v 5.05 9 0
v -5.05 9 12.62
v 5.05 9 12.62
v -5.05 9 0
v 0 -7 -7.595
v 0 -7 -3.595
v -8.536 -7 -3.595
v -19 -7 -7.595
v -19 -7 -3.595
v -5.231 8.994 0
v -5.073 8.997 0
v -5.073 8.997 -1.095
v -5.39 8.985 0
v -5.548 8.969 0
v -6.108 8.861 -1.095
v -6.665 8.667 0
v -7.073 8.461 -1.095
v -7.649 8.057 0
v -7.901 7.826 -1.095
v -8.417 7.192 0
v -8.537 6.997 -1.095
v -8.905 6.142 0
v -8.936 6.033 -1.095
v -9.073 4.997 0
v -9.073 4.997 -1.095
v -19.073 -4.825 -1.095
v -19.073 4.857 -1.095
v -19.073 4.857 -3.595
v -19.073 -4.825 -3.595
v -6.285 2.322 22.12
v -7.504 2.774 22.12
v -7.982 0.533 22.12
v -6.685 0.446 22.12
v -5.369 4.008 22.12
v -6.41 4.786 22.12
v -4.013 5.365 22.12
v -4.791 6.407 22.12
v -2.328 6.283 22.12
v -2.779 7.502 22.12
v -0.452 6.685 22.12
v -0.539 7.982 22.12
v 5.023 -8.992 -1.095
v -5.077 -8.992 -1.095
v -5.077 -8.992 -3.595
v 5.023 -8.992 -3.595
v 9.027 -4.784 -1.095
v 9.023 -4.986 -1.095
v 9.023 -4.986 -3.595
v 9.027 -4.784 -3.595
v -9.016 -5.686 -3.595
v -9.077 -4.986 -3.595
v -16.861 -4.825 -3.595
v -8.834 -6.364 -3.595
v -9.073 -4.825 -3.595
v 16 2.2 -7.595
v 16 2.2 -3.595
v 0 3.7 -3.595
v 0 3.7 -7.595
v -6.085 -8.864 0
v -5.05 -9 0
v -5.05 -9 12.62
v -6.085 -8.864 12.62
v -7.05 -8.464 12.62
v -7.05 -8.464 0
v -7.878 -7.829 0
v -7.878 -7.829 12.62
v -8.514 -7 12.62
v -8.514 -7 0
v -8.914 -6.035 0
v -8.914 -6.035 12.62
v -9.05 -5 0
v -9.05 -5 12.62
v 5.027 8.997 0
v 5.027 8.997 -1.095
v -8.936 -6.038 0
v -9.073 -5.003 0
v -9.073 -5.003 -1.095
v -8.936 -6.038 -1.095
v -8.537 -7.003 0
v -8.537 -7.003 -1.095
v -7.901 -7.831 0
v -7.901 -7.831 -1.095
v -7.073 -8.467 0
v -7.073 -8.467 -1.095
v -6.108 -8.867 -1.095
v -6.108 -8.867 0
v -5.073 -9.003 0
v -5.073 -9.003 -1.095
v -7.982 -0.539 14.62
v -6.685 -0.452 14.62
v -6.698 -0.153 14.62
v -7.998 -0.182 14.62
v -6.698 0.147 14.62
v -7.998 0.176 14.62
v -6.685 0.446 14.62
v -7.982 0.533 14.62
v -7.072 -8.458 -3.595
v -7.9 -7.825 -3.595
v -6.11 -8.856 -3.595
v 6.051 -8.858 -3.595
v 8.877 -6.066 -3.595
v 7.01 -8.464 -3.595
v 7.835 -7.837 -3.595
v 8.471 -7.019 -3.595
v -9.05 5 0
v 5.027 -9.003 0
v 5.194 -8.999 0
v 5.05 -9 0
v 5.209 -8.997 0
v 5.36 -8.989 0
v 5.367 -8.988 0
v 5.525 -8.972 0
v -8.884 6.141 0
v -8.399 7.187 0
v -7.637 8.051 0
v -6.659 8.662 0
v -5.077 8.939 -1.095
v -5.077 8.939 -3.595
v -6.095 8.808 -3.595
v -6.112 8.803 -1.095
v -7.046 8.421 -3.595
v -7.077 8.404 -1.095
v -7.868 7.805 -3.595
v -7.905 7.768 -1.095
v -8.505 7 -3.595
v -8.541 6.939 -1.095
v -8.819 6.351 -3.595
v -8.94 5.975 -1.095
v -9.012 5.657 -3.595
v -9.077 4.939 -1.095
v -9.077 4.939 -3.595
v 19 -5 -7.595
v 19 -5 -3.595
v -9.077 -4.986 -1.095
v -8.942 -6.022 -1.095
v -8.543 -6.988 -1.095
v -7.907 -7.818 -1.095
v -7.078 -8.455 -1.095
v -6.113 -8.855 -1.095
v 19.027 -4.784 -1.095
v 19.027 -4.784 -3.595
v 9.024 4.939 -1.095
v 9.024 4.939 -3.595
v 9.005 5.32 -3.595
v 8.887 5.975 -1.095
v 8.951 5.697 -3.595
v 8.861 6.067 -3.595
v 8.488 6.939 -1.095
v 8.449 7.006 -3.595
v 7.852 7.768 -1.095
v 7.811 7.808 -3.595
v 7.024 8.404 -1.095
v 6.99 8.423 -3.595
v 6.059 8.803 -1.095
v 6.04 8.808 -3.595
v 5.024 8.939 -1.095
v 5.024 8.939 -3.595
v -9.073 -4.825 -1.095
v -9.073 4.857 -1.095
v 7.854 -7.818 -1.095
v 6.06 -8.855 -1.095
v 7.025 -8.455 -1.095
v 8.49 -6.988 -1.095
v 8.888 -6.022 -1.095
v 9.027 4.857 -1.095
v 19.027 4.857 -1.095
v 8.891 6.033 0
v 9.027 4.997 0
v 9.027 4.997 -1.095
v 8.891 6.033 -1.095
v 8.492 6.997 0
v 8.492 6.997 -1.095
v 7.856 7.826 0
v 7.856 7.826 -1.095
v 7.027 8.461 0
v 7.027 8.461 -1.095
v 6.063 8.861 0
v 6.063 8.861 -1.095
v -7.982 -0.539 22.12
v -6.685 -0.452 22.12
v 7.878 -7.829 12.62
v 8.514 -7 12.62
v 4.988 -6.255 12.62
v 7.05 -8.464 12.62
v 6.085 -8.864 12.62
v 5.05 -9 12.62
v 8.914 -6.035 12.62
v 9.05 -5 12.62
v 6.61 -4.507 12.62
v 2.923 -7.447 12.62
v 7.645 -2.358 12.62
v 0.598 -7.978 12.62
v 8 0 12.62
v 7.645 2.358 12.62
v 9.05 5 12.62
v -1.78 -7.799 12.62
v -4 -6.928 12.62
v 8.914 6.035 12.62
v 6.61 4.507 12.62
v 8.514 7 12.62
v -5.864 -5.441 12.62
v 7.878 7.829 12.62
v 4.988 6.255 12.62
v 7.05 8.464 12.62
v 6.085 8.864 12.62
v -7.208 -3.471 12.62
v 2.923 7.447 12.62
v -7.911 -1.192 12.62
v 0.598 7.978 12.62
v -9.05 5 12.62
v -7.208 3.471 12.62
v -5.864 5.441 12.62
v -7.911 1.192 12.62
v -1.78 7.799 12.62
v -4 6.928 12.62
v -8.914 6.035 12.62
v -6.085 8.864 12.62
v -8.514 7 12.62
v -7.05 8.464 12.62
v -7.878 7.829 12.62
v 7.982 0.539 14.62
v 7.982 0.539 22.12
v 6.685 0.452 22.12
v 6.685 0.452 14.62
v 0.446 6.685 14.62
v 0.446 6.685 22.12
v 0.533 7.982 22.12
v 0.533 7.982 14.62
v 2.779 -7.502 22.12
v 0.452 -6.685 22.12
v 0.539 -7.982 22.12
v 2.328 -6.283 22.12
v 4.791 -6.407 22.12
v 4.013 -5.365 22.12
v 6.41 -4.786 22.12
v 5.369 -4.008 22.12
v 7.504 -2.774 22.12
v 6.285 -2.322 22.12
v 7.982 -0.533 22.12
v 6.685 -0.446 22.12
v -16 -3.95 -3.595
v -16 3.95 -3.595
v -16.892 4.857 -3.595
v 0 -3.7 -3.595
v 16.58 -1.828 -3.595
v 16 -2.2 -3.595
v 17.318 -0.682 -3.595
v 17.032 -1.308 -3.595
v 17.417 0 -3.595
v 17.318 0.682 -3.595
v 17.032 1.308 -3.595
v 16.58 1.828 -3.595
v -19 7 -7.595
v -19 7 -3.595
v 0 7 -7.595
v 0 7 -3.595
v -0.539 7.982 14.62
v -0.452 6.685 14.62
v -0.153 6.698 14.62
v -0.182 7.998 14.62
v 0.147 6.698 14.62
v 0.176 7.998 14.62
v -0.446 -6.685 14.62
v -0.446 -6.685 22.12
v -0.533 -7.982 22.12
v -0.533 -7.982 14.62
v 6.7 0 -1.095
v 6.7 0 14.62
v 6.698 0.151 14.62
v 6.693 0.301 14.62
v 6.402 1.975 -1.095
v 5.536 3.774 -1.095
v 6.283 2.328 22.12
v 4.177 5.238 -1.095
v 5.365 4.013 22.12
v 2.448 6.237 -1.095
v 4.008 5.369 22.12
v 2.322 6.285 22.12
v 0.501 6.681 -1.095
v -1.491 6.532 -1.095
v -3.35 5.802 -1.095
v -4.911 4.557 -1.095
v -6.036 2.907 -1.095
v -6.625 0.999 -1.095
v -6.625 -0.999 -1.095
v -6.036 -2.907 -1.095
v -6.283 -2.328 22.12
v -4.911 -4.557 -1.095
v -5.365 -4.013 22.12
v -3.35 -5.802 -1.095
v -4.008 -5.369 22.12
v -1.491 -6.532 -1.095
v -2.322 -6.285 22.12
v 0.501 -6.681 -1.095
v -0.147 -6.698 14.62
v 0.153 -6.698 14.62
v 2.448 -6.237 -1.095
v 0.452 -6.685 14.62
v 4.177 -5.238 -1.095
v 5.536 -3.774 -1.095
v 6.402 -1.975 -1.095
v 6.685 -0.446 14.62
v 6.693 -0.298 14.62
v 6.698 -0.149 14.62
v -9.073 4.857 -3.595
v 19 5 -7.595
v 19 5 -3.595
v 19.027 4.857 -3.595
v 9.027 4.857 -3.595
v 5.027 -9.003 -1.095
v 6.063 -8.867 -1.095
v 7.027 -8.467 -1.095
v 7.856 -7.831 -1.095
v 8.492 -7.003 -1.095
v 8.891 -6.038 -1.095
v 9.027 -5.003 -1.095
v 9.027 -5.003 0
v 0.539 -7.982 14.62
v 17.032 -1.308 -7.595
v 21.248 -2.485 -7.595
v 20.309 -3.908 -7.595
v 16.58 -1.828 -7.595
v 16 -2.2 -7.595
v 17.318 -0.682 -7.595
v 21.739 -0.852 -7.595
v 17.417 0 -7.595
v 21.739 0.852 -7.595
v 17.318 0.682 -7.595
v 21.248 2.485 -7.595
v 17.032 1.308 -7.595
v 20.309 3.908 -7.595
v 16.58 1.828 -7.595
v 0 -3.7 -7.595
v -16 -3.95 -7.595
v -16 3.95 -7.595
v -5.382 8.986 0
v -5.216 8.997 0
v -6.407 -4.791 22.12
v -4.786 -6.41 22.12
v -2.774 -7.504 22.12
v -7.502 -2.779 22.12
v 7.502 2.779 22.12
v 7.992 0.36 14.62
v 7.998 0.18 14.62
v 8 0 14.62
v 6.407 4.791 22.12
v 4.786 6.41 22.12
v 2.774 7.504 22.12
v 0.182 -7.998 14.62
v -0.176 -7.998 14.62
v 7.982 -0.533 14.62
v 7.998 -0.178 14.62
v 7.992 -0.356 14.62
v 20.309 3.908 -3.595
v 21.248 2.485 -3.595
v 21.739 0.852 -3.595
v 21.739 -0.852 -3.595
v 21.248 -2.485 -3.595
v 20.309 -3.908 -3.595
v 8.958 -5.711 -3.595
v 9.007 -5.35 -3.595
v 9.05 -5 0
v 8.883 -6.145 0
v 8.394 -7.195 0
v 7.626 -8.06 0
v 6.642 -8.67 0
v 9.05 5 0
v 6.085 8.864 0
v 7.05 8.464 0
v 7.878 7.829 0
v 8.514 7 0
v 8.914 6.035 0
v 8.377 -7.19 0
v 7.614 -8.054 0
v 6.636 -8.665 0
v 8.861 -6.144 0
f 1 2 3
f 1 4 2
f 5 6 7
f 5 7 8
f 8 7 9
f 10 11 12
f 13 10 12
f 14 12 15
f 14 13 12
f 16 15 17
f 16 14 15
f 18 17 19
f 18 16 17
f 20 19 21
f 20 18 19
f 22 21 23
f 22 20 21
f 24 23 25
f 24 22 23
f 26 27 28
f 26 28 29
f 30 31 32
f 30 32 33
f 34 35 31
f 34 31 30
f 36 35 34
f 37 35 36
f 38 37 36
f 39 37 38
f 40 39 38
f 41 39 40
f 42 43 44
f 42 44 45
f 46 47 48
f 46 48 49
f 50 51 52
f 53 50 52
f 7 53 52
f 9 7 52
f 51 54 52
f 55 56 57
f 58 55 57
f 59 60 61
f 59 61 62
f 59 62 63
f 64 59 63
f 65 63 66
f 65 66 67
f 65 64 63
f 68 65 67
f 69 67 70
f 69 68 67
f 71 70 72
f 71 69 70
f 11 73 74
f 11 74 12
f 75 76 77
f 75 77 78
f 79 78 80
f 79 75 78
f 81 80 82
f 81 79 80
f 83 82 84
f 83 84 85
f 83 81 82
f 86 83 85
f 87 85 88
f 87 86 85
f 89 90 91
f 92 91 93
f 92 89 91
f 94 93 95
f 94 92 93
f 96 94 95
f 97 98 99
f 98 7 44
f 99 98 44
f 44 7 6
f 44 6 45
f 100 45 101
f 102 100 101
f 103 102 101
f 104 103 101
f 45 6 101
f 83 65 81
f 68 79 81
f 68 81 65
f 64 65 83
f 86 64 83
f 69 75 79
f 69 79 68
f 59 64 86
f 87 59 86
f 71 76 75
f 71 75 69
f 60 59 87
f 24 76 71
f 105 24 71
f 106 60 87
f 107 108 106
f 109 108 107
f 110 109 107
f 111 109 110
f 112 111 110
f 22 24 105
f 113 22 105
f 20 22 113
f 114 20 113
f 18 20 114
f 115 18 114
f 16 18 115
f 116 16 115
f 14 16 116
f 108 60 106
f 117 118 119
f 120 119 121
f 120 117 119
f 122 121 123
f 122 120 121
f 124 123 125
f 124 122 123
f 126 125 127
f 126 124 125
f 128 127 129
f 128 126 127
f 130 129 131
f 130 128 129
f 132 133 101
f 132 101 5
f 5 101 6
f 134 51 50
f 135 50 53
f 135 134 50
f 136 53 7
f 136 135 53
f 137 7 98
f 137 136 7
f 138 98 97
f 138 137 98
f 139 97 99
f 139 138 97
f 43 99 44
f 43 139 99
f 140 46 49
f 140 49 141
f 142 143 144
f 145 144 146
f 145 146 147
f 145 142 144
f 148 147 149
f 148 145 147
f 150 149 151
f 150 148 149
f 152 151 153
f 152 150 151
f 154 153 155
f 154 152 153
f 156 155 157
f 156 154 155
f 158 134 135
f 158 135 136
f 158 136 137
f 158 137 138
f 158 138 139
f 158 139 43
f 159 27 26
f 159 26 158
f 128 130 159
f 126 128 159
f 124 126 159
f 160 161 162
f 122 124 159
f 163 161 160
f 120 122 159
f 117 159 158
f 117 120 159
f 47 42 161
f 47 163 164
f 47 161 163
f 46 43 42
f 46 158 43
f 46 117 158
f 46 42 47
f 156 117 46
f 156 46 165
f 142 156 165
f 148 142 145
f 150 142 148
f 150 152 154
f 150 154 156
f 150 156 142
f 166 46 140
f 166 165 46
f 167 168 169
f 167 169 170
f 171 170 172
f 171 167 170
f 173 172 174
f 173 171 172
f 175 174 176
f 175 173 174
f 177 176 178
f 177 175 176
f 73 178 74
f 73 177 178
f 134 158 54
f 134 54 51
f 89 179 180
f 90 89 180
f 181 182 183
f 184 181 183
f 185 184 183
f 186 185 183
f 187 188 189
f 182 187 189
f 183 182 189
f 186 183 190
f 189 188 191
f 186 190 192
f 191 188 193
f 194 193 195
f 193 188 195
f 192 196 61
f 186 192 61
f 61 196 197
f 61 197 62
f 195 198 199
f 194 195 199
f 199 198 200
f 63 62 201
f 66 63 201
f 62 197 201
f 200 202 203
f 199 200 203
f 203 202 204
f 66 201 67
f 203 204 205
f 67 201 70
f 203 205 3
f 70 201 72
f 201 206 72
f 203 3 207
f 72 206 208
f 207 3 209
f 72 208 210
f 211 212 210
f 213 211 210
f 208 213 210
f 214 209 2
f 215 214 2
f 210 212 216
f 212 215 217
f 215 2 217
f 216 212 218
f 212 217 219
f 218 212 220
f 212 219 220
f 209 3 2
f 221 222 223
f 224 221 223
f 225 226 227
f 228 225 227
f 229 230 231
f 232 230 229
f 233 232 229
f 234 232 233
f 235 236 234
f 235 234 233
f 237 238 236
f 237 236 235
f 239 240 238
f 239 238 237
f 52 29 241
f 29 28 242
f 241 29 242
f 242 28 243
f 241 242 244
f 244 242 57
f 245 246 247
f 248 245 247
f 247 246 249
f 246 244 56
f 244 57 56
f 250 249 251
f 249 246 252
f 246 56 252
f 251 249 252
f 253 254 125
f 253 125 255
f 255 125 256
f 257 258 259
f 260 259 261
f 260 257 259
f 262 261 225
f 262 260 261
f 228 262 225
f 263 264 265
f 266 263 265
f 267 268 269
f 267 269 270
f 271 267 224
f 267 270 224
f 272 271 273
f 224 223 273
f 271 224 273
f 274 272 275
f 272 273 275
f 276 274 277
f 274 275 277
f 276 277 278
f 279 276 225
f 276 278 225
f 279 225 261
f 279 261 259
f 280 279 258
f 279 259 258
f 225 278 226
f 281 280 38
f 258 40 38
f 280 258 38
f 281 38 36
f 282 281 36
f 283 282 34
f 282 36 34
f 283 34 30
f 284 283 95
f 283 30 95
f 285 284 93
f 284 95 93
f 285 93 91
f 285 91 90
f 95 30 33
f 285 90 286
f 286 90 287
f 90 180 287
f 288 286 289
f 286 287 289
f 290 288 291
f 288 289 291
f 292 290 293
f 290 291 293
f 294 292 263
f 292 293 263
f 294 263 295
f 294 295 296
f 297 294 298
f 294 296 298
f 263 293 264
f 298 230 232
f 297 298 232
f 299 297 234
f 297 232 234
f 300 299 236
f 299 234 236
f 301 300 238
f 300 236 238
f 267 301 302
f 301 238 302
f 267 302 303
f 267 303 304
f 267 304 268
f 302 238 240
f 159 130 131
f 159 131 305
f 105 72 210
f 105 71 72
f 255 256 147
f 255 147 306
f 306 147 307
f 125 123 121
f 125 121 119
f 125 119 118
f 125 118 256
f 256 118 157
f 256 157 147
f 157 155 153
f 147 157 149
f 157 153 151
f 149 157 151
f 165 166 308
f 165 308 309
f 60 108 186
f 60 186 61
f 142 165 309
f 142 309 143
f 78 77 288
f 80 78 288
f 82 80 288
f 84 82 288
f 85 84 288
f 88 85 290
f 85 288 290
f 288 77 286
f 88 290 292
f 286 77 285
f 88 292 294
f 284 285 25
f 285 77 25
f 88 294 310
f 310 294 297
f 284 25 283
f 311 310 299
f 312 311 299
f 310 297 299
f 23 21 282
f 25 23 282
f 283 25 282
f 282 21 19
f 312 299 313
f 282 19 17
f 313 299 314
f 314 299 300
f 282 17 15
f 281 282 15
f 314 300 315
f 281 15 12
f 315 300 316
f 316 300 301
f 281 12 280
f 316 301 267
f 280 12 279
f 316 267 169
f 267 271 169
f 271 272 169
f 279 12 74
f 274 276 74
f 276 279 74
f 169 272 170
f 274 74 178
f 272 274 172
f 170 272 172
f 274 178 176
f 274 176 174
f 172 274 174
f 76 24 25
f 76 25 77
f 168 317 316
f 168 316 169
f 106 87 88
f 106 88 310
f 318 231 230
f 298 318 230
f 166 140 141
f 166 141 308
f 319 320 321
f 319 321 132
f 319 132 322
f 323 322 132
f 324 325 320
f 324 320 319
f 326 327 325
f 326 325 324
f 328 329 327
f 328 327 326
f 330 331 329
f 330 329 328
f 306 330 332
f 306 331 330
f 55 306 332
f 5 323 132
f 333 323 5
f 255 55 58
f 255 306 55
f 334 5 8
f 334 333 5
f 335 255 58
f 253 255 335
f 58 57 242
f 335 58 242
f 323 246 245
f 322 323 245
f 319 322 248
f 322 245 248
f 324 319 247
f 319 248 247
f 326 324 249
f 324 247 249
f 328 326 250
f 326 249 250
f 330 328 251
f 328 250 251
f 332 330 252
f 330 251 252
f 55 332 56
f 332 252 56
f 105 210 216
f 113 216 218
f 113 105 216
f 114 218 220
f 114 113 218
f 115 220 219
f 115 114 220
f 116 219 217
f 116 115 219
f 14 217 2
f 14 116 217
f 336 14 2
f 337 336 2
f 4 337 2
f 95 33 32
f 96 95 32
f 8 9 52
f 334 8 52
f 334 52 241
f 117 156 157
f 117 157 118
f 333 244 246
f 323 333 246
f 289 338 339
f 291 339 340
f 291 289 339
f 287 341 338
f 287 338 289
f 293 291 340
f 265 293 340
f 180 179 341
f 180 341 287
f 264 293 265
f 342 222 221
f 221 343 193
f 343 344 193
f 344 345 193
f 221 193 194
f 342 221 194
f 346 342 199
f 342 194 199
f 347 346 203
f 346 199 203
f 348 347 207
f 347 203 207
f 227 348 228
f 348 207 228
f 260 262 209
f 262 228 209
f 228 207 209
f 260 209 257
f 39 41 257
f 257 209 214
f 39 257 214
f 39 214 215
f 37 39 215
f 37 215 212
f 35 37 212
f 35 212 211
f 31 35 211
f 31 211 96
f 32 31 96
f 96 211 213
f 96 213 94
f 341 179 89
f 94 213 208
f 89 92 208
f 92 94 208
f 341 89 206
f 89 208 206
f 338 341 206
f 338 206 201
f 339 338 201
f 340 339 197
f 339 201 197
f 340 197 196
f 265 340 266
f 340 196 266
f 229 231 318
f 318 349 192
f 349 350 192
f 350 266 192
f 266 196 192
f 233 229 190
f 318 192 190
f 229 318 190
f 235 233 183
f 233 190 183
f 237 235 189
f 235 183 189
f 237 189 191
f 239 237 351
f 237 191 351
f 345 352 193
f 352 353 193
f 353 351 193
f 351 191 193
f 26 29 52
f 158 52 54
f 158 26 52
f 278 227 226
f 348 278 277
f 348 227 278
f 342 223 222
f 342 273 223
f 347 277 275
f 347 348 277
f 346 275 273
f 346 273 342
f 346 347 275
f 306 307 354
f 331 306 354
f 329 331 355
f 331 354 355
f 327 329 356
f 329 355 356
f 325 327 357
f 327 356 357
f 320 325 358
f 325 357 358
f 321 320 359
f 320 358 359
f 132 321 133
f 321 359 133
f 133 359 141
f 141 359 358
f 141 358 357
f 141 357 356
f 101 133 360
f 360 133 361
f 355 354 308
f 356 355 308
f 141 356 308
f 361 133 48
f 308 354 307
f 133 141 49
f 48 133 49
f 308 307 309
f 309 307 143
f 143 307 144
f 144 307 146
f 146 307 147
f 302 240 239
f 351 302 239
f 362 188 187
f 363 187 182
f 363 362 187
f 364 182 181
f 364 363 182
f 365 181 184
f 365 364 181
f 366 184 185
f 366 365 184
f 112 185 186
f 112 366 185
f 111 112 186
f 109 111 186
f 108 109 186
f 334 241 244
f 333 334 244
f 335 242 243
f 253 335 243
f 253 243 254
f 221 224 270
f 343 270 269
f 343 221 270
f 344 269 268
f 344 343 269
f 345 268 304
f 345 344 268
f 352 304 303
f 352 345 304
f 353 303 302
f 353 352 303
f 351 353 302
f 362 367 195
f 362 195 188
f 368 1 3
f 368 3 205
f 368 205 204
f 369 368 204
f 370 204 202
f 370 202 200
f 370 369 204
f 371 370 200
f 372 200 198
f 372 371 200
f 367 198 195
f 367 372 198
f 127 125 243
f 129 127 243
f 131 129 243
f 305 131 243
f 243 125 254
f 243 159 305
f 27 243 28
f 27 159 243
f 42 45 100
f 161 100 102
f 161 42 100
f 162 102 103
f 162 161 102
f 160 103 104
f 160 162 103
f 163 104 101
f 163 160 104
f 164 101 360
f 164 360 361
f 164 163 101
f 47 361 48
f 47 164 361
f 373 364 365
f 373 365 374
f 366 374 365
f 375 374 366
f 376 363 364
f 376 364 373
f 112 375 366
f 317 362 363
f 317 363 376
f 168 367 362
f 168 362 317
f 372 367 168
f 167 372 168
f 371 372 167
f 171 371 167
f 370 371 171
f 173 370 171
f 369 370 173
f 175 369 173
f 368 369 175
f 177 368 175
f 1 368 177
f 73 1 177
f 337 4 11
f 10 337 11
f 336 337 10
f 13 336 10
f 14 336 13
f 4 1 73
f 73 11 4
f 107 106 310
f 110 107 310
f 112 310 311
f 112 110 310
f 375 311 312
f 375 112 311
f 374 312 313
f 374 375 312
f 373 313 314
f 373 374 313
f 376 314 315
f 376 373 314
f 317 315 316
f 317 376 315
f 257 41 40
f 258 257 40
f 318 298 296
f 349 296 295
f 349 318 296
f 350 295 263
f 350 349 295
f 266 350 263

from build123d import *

# Parameters (mm, degrees)
BOSS_EXTRUDE1_DEPTH = 2
BOSS_EXTRUDE2_DEPTH = 11.02
BOSS_EXTRUDE3_DEPTH = 1.6
SKETCH4_R           = 8
BOSS_EXTRUDE4_DEPTH = 9.5
SKETCH5_R           = 6.65
CUT_EXTRUDE1_DEPTH  = 20
BOSS_EXTRUDE5_DEPTH = 1.095
SKETCH13_R          = 6.7
CUT_EXTRUDE3_DEPTH  = 30
CUT_EXTRUDE4_DEPTH  = 7.5
CIRPATTERN2_COUNT   = 4
BOSS_EXTRUDE6_DEPTH = 2.5
BOSS_EXTRUDE7_DEPTH = 4


with BuildPart() as part:
    # Sketch1 → Boss-Extrude1 (new body)
    with BuildSketch(Plane.XY):
        with BuildLine():
            Line((-5.05, 9.000108401), (5.05, 9.000108401))
            ThreePointArc((5.05, 9.000108401), (7.878427125, 7.828535526), (9.05, 5.000108401))
            Line((9.05, 5.000108401), (9.05, -5.000108401))
            ThreePointArc((9.05, -5.000108401), (7.878427125, -7.828535526), (5.05, -9.000108401))
            Line((5.05, -9.000108401), (-5.05, -9.000108401))
            ThreePointArc((-5.05, -9.000108401), (-7.878427125, -7.828535526), (-9.05, -5.000108401))
            Line((-9.05, -5.000108401), (-9.05, 5.000108401))
            ThreePointArc((-9.05, 5.000108401), (-7.878427125, 7.828535526), (-5.05, 9.000108401))
        make_face()
    extrude(amount=BOSS_EXTRUDE1_DEPTH)

    # Sketch2 → Boss-Extrude2 (add)
    with BuildSketch(Plane.XY):
        with BuildLine():
            Line((-5.05, 9.000108401), (5.05, 9.000108401))
            ThreePointArc((5.05, 9.000108401), (7.878427125, 7.828535526), (9.05, 5.000108401))
            Line((9.05, 5.000108401), (9.05, -5.000108401))
            ThreePointArc((9.05, -5.000108401), (7.878427125, -7.828535526), (5.05, -9.000108401))
            Line((5.05, -9.000108401), (-5.05, -9.000108401))
            ThreePointArc((-5.05, -9.000108401), (-7.878427125, -7.828535526), (-9.05, -5.000108401))
            Line((-9.05, -5.000108401), (-9.05, 5.000108401))
            ThreePointArc((-9.05, 5.000108401), (-7.878427125, 7.828535526), (-5.05, 9.000108401))
        make_face()
    extrude(amount=BOSS_EXTRUDE2_DEPTH)

    # Sketch3 → Boss-Extrude3 (add)
    with BuildSketch(Plane.XY.offset(11.02)):
        with BuildLine():
            Line((-5.05, 9.000108401), (5.05, 9.000108401))
            ThreePointArc((5.05, 9.000108401), (7.878427125, 7.828535526), (9.05, 5.000108401))
            Line((9.05, 5.000108401), (9.05, -5.000108401))
            ThreePointArc((9.05, -5.000108401), (7.878427125, -7.828535526), (5.05, -9.000108401))
            Line((5.05, -9.000108401), (-5.05, -9.000108401))
            ThreePointArc((-5.05, -9.000108401), (-7.878427125, -7.828535526), (-9.05, -5.000108401))
            Line((-9.05, -5.000108401), (-9.05, 5.000108401))
            ThreePointArc((-9.05, 5.000108401), (-7.878427125, 7.828535526), (-5.05, 9.000108401))
        make_face()
    extrude(amount=BOSS_EXTRUDE3_DEPTH)

    # Sketch4 → Boss-Extrude4 (add)
    with BuildSketch(Plane.XY.offset(12.62)):
        Circle(SKETCH4_R)
    extrude(amount=BOSS_EXTRUDE4_DEPTH)

    # Sketch5 → Cut-Extrude1 (cut)
    with BuildSketch(Plane.XY.offset(12.62)):
        Circle(SKETCH5_R)
    extrude(amount=CUT_EXTRUDE1_DEPTH, mode=Mode.SUBTRACT)

    # Sketch12 → Boss-Extrude5 (add)
    with BuildSketch(Plane(origin=(0, 0, 0), x_dir=(-1, 0, 0), z_dir=(0, 0, -1))):
        with BuildLine():
            Line((-5.027404416, 8.997340309), (5.072595584, 8.997340309))
            ThreePointArc((5.072595584, 8.997340309), (7.901022709, 7.825767433), (9.072595584, 4.997340309))
            Line((9.072595584, 4.997340309), (9.072595584, -5.002876493))
            ThreePointArc((9.072595584, -5.002876493), (7.901022709, -7.831303618), (5.072595584, -9.002876493))
            Line((5.072595584, -9.002876493), (-5.027404416, -9.002876493))
            ThreePointArc((-5.027404416, -9.002876493), (-7.85583154, -7.831303618), (-9.027404416, -5.002876493))
            Line((-9.027404416, -5.002876493), (-9.027404416, 4.997340309))
            ThreePointArc((-9.027404416, 4.997340309), (-7.85583154, 7.825767433), (-5.027404416, 8.997340309))
        make_face()
    extrude(amount=BOSS_EXTRUDE5_DEPTH)

    # Sketch13 → Cut-Extrude3 (cut, symmetric)
    with BuildSketch(Plane.XY):
        Circle(SKETCH13_R)
    extrude(amount=CUT_EXTRUDE3_DEPTH, both=True, mode=Mode.SUBTRACT)

    # Sketch15 → Cut-Extrude4 (cut)
    with BuildSketch(Plane.XY.offset(22.12)):
        Polygon((-0.552830798, 8.187091014), (-0.002830798, 0.003314653), (0.547169202, 8.187091014), (0.617169202, 9.000108401), (-0.626042329, 9.000108401), align=None)
    cut_extrude4 = extrude(amount=-CUT_EXTRUDE4_DEPTH, mode=Mode.SUBTRACT)

    # CirPattern2: Cut-Extrude4 ×4 about axis
    cirpattern2_axis = Axis((0, 0, 0), (0, 0, 1))
    for i in range(1, CIRPATTERN2_COUNT):
        add(cut_extrude4.rotate(cirpattern2_axis, i * 360 / CIRPATTERN2_COUNT), mode=Mode.SUBTRACT)


with BuildPart() as body_2:
    # Sketch16 → Boss-Extrude6 (new body)
    with BuildSketch(Plane(origin=(0, 0, -1.095), x_dir=(-1, 0, 0), z_dir=(0, 0, -1))):
        with BuildLine():
            Line((-5.0235757, 8.939451881), (5.076696464, 8.939451881))
            ThreePointArc((5.076696464, 8.939451881), (7.905123589, 7.767879006), (9.076696464, 4.939451881))
            Line((9.076696464, 4.939451881), (9.072595584, 4.856889481))
            Line((9.072595584, 4.856889481), (19.072595584, 4.856889481))
            Line((19.072595584, 4.856889481), (19.072595584, -4.825488195))
            Line((19.072595584, -4.825488195), (9.072595584, -4.825488195))
            Line((9.072595584, -4.825488195), (9.076550984, -4.98570964))
            ThreePointArc((9.076550984, -4.98570964), (7.907149741, -7.818099531), (5.076555683, -8.991841001))
            Line((5.076555683, -8.991841001), (-5.023434919, -8.991841001))
            ThreePointArc((-5.023434919, -8.991841001), (-7.854028977, -7.818099531), (-9.02343022, -4.98570964))
            Line((-9.02343022, -4.98570964), (-9.027404416, -4.784110513))
            Line((-9.027404416, -4.784110513), (-19.027404416, -4.784110513))
            Line((-19.027404416, -4.784110513), (-19.027404416, 4.856889481))
            Line((-19.027404416, 4.856889481), (-9.027404416, 4.856889481))
            Line((-9.027404416, 4.856889481), (-9.0235757, 4.939451881))
            ThreePointArc((-9.0235757, 4.939451881), (-7.852002825, 7.767879006), (-5.0235757, 8.939451881))
        make_face()
    extrude(amount=BOSS_EXTRUDE6_DEPTH)

    # Sketch17 → Boss-Extrude7 (add)
    with BuildSketch(Plane(origin=(0, 0, -3.595), x_dir=(-1, 0, 0), z_dir=(0, 0, -1))):
        with BuildLine():
            Line((0, 7), (-19, 5))
            ThreePointArc((-19, 5), (-21.800833997, 0), (-19, -5))
            Line((-19, -5), (0, -7))
            Line((0, -7), (19, -7))
            Line((19, -7), (16, -3.95))
            Line((16, -3.95), (0, -3.7))
            Line((0, -3.7), (-16, -2.2))
            ThreePointArc((-16, -2.2), (-17.416609195, 0), (-16, 2.2))
            Line((-16, 2.2), (0, 3.7))
            Line((0, 3.7), (16, 3.95))
            Line((16, 3.95), (19, 7))
            Line((19, 7), (0, 7))
        make_face()
    extrude(amount=BOSS_EXTRUDE7_DEPTH)


solid = Compound([part.part, body_2.part])
